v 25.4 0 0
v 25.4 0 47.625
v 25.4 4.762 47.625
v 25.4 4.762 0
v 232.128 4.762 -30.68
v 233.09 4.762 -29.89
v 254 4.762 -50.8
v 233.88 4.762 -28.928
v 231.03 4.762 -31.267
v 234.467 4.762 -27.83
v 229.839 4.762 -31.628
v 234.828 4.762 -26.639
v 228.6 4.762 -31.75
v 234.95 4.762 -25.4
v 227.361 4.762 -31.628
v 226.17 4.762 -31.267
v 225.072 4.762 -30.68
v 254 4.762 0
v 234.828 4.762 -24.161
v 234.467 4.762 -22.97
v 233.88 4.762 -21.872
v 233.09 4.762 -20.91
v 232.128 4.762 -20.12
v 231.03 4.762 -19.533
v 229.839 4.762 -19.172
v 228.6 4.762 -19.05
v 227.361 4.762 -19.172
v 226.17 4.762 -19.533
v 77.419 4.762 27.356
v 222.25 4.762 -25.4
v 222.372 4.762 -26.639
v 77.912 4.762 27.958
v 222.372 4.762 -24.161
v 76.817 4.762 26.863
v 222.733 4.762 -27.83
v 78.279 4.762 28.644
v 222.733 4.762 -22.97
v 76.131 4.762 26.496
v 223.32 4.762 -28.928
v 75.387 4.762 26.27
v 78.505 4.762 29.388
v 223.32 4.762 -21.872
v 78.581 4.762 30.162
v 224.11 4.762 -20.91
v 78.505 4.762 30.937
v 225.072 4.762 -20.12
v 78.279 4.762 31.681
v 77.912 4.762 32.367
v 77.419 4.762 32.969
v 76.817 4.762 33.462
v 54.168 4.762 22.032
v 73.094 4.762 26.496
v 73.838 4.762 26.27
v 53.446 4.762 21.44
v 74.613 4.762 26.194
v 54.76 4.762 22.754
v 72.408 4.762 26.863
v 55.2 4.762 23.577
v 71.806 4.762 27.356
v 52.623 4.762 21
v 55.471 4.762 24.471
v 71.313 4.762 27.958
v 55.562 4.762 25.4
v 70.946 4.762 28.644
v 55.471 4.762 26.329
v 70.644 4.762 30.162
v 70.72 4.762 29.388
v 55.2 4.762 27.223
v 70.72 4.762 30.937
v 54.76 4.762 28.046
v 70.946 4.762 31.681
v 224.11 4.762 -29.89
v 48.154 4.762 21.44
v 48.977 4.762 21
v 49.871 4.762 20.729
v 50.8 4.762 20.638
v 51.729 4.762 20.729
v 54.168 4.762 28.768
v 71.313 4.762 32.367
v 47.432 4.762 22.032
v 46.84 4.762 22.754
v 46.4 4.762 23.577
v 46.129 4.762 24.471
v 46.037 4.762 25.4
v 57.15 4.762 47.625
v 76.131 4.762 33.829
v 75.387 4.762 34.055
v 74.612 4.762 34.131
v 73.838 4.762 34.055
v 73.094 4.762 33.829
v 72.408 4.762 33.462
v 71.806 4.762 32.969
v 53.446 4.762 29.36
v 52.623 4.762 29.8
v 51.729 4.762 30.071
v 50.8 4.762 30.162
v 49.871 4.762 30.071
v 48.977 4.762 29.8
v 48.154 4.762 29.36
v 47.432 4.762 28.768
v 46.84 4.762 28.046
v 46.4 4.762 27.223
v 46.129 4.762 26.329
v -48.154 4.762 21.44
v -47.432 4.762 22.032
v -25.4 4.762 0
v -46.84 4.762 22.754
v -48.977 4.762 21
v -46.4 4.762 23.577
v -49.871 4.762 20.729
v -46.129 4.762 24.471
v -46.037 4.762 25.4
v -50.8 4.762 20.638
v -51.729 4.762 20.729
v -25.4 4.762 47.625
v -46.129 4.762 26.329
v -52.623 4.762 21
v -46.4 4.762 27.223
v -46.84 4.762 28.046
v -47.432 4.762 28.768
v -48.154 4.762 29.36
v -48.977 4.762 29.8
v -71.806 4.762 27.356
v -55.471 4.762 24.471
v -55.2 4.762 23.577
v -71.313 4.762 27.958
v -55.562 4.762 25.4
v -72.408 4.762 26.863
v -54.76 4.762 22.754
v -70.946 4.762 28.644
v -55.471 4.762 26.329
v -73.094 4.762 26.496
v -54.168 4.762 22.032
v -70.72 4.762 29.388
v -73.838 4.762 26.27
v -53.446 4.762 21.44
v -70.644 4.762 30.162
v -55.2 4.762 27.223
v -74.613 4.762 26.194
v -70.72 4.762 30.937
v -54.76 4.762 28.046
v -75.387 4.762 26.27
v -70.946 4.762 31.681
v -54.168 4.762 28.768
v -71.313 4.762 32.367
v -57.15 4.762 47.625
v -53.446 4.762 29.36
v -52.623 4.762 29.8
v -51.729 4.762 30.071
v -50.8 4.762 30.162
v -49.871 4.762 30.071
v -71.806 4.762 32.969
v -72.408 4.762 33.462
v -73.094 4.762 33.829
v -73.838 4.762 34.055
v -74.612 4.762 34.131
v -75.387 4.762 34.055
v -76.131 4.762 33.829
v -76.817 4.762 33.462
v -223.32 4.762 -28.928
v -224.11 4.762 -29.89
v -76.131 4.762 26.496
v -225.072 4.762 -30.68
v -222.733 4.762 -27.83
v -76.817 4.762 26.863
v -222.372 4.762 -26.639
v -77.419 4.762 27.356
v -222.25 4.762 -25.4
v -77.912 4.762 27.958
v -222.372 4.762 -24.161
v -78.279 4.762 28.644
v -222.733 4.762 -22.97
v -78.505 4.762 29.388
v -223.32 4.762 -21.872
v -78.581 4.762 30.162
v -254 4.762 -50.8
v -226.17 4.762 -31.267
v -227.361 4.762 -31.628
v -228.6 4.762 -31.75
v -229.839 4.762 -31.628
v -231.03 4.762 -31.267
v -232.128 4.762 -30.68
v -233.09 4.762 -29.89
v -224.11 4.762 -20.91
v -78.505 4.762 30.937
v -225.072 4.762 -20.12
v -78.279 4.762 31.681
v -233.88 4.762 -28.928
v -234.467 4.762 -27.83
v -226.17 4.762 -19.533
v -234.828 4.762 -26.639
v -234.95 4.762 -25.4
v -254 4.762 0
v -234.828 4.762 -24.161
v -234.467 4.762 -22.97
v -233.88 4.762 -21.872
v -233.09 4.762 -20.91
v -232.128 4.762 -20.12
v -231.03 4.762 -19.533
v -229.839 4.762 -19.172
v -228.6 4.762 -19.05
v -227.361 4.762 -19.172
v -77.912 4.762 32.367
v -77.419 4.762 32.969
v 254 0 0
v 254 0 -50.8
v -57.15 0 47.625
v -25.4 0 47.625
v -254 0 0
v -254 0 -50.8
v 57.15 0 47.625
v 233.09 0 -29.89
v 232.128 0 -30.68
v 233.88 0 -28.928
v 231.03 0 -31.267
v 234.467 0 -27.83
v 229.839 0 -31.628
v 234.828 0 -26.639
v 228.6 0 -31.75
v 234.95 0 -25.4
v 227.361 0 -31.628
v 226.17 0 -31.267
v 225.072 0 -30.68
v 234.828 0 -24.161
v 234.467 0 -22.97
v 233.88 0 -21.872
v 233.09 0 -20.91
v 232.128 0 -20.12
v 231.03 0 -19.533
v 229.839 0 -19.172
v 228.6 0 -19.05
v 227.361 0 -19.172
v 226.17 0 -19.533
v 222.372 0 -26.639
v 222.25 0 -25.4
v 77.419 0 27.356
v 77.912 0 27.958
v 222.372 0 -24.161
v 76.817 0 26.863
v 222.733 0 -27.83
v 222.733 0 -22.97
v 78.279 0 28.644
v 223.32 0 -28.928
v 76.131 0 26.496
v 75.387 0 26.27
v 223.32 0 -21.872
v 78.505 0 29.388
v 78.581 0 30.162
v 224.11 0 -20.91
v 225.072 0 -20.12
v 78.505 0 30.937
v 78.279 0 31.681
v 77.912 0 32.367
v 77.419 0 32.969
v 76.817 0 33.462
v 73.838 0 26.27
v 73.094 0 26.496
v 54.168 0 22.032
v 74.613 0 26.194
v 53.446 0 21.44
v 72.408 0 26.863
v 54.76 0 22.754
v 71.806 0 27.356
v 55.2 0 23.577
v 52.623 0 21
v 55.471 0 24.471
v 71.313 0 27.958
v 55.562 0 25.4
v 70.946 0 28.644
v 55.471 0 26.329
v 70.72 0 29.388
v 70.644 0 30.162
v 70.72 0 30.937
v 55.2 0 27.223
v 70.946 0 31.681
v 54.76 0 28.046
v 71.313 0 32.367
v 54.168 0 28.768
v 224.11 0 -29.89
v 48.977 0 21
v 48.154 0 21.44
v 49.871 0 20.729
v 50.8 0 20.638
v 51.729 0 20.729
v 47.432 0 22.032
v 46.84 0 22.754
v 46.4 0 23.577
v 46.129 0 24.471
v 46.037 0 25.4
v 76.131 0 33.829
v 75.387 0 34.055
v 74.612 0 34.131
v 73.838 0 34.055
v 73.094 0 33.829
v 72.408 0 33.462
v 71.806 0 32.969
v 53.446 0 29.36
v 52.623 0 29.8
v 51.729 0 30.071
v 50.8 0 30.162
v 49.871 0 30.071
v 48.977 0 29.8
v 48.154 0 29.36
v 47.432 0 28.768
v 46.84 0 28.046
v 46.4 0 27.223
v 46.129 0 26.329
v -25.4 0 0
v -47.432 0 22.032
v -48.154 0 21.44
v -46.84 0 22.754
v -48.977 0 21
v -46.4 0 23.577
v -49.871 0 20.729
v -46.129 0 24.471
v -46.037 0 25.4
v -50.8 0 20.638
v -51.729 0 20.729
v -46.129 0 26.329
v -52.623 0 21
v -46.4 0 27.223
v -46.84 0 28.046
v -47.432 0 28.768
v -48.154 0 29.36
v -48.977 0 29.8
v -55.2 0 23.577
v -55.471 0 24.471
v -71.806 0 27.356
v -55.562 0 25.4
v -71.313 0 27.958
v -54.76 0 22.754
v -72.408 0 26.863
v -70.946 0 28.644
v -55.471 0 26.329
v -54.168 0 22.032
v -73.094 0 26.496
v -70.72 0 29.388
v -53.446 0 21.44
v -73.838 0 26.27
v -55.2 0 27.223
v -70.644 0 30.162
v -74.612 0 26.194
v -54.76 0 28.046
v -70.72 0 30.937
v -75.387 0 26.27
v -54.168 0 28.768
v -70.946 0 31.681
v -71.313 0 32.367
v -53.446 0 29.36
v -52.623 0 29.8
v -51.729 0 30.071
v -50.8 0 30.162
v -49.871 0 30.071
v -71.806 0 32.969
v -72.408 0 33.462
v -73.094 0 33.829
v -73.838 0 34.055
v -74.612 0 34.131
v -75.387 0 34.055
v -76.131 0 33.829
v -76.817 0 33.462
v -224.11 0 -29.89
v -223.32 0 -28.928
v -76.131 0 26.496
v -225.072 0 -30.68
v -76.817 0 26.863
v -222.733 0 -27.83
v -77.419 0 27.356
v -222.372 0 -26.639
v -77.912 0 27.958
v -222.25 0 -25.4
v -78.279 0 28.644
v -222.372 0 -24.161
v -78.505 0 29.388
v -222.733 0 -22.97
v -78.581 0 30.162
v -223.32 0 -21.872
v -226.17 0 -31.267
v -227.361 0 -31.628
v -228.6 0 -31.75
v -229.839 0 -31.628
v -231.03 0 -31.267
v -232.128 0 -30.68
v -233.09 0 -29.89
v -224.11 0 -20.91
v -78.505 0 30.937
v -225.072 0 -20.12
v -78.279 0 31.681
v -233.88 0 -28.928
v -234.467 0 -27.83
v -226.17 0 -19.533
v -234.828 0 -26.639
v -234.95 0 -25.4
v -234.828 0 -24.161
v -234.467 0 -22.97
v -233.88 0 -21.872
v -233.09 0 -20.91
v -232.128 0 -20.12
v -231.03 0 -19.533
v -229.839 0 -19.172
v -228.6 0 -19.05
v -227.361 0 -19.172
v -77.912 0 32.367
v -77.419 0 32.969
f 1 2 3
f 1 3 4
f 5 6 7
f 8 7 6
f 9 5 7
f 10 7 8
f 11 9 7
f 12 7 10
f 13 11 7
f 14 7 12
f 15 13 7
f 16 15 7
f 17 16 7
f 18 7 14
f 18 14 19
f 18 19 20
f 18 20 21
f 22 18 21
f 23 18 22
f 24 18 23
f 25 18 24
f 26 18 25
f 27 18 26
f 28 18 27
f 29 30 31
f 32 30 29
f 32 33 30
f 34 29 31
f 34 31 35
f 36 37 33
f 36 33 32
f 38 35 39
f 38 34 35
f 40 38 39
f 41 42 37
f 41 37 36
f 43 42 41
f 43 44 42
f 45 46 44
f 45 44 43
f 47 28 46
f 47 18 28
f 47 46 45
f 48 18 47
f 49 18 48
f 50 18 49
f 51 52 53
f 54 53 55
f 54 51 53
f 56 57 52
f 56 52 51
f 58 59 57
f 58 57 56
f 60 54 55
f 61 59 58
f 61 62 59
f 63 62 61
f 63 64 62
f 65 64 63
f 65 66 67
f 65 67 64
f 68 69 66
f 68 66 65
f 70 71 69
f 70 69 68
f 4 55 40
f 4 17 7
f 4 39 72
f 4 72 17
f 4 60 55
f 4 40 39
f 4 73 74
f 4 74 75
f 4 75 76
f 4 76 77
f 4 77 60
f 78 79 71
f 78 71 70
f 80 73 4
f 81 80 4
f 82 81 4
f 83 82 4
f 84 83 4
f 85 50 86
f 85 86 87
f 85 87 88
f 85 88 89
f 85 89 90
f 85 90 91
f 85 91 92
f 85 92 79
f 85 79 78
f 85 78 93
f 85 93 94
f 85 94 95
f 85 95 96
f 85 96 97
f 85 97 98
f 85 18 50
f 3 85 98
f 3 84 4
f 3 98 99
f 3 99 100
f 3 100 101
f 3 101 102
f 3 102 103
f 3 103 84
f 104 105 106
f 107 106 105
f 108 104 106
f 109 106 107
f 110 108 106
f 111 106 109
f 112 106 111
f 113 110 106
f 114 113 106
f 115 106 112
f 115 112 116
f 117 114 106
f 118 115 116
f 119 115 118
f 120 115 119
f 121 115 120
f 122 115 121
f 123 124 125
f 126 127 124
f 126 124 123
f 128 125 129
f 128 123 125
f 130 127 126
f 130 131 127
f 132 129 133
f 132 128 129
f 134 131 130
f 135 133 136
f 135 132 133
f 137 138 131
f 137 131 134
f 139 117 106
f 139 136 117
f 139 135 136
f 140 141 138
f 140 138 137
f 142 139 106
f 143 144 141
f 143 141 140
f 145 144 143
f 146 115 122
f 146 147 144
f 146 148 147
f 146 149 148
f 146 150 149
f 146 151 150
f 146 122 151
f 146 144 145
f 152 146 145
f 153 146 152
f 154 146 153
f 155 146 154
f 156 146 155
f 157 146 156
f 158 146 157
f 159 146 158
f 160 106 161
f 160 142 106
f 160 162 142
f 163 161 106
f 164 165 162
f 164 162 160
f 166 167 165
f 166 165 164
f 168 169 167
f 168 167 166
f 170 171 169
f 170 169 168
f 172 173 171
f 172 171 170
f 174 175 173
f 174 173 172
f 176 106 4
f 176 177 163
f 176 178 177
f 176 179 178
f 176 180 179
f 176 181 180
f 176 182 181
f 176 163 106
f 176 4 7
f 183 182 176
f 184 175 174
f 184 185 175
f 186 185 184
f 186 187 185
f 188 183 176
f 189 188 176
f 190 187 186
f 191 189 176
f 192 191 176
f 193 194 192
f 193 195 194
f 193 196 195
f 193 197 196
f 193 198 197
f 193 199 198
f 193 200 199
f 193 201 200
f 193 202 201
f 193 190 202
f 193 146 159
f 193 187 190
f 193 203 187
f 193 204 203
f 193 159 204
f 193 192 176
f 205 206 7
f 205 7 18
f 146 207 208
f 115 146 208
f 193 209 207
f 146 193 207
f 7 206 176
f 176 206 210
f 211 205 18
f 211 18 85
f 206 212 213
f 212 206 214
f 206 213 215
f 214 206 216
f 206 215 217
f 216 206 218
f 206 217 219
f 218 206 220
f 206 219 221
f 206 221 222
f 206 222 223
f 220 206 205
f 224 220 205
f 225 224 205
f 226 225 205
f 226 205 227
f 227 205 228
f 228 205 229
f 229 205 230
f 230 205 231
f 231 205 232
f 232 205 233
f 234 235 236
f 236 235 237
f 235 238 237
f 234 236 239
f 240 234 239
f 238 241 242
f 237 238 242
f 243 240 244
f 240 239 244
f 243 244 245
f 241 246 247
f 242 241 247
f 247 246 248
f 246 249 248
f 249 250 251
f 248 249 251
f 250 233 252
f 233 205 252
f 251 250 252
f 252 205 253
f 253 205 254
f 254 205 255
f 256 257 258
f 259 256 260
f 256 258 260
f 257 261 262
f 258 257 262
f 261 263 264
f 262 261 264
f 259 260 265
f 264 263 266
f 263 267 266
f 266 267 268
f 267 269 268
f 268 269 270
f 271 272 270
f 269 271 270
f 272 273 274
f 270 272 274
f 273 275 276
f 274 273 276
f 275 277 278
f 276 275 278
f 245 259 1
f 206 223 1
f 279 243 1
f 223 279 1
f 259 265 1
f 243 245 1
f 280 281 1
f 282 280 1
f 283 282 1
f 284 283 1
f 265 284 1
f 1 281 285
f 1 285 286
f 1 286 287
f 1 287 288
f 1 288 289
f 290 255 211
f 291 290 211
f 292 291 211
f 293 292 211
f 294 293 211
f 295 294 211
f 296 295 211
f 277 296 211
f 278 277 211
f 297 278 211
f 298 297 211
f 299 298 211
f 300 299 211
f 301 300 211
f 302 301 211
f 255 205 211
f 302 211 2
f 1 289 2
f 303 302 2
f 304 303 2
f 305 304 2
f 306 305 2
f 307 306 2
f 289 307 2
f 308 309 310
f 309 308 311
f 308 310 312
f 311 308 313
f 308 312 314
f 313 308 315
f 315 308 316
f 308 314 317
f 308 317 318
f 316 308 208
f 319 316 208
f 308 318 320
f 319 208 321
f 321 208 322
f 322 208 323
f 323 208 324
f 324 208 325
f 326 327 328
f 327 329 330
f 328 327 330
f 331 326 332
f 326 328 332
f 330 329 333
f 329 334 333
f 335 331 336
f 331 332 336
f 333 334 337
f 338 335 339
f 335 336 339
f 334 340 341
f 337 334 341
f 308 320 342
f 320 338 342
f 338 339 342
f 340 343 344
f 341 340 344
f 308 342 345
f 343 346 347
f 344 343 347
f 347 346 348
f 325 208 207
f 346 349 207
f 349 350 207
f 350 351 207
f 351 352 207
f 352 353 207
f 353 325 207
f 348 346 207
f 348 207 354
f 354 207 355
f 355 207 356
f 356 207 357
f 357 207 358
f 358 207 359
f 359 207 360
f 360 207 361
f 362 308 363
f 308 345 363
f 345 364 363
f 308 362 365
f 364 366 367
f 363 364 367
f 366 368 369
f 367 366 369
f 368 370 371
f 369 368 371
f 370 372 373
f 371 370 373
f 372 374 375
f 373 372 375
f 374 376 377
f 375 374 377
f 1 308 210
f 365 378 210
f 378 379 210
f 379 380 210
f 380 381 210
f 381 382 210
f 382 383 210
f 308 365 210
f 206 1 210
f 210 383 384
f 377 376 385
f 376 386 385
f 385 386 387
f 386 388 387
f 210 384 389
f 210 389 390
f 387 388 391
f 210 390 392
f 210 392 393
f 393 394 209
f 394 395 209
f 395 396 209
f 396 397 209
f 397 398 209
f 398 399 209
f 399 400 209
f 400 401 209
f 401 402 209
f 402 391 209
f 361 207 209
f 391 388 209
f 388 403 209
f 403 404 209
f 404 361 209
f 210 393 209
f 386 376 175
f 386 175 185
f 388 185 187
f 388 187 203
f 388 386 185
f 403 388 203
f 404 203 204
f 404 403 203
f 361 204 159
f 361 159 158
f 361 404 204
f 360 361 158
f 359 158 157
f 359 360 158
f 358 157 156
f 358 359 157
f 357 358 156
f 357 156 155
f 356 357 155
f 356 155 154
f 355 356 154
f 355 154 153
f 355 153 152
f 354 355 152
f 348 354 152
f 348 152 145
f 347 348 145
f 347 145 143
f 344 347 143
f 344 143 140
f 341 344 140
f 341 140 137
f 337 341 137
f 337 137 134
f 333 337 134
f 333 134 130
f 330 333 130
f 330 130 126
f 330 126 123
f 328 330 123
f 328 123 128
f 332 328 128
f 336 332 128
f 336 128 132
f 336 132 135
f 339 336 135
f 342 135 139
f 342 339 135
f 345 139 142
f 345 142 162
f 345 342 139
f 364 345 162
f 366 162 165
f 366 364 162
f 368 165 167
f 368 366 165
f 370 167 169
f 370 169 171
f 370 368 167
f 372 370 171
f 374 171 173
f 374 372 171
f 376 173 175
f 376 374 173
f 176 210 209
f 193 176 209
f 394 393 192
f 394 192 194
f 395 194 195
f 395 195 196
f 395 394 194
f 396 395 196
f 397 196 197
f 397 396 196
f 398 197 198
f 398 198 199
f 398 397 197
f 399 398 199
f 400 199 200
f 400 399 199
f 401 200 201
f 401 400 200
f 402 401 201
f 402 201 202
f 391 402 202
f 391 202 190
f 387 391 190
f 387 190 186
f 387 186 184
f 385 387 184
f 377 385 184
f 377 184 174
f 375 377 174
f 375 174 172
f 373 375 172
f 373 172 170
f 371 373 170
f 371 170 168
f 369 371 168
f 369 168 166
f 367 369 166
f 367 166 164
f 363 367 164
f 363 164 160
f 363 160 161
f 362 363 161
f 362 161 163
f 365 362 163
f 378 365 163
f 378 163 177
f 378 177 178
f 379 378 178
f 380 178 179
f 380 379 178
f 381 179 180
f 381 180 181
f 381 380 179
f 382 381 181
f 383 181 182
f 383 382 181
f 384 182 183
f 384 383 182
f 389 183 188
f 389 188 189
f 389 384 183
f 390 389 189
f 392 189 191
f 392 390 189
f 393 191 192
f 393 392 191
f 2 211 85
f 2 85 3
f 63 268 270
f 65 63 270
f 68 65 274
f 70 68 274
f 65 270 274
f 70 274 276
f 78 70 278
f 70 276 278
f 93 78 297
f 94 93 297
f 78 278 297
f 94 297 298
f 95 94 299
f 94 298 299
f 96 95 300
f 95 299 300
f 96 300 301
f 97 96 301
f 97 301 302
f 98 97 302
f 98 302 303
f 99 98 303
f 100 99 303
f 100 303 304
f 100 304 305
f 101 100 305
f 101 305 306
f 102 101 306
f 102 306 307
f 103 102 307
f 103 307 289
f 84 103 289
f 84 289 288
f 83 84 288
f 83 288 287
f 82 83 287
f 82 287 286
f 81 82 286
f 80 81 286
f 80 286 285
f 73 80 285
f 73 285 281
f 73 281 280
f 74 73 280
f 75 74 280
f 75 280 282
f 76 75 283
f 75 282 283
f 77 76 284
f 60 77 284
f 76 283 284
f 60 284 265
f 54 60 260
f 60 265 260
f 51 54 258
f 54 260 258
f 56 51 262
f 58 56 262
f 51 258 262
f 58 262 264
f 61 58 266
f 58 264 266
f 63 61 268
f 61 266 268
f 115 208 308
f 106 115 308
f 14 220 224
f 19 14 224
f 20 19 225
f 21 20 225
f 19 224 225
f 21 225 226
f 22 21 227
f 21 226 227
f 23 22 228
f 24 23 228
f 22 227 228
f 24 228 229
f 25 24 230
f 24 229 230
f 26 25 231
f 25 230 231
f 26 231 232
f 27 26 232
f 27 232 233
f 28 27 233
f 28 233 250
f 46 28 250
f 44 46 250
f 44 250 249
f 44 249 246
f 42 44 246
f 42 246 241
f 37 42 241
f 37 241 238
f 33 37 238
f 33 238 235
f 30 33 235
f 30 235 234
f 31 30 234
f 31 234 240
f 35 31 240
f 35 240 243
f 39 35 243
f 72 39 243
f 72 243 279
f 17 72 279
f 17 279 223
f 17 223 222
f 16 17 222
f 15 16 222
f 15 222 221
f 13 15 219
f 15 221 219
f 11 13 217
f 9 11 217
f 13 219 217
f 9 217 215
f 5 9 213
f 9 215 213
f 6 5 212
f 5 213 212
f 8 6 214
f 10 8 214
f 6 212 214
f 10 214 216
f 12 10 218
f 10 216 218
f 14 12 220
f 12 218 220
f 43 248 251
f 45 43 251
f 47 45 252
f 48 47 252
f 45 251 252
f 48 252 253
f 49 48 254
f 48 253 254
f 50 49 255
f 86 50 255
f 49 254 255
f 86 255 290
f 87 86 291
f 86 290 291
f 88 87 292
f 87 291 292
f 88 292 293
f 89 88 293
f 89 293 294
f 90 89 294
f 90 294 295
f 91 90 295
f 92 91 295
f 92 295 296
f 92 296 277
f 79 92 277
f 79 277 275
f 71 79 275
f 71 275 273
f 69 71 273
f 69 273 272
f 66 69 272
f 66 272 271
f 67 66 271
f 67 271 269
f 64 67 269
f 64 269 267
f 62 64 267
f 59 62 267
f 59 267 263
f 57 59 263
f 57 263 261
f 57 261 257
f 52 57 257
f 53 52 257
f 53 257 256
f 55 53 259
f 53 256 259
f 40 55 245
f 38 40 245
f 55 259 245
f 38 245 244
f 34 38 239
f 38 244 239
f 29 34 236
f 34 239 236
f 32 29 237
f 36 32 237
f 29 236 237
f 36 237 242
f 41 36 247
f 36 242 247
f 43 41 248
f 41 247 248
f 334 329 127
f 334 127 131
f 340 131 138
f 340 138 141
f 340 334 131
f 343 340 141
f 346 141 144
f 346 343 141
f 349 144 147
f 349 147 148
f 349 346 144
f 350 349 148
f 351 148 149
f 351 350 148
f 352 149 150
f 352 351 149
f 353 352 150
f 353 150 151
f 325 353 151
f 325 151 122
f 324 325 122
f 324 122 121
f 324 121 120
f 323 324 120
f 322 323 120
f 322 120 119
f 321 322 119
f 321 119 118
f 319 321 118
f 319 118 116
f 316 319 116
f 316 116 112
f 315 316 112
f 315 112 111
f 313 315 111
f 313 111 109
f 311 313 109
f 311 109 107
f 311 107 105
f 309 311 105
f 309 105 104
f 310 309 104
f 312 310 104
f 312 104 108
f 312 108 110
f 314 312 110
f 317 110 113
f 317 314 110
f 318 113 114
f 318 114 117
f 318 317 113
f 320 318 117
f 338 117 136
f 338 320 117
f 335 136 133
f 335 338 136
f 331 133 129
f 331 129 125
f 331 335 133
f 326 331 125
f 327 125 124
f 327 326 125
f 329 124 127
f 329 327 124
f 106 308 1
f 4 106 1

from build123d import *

# Parameters (mm, degrees)
F1_DEPTH = 4.7625
F2_R     = 6.35
F2_R_2   = 3.96875
F2_R_3   = 4.7625
F3_DEPTH = 4.7635


with BuildPart() as f1:
    # F0 (on Front) → F1 (new body)
    with BuildSketch(Plane.XZ):
        Polygon((25.4, 0), (0, 0), (0, -50.8), (254, -50.8), (254, 0), (57.15, 47.625), (25.4, 47.625), align=None)
    extrude(amount=-F1_DEPTH)

    # F2 (on Front) → F3 (cut, through all)
    with BuildSketch(Plane.XZ):
        with Locations((228.6, -25.4)):
            Circle(F2_R)
        with Locations((74.6125, 30.1625)):
            Circle(F2_R_2)
        with Locations((50.8, 25.4)):
            Circle(F2_R_3)
    extrude(amount=-F3_DEPTH, mode=Mode.SUBTRACT)

    # F4: F1 across plane


with BuildPart() as f1_1:
    add(f1.part)
    add(f1.part.mirror(Plane.YZ))


solid = f1_1.part
